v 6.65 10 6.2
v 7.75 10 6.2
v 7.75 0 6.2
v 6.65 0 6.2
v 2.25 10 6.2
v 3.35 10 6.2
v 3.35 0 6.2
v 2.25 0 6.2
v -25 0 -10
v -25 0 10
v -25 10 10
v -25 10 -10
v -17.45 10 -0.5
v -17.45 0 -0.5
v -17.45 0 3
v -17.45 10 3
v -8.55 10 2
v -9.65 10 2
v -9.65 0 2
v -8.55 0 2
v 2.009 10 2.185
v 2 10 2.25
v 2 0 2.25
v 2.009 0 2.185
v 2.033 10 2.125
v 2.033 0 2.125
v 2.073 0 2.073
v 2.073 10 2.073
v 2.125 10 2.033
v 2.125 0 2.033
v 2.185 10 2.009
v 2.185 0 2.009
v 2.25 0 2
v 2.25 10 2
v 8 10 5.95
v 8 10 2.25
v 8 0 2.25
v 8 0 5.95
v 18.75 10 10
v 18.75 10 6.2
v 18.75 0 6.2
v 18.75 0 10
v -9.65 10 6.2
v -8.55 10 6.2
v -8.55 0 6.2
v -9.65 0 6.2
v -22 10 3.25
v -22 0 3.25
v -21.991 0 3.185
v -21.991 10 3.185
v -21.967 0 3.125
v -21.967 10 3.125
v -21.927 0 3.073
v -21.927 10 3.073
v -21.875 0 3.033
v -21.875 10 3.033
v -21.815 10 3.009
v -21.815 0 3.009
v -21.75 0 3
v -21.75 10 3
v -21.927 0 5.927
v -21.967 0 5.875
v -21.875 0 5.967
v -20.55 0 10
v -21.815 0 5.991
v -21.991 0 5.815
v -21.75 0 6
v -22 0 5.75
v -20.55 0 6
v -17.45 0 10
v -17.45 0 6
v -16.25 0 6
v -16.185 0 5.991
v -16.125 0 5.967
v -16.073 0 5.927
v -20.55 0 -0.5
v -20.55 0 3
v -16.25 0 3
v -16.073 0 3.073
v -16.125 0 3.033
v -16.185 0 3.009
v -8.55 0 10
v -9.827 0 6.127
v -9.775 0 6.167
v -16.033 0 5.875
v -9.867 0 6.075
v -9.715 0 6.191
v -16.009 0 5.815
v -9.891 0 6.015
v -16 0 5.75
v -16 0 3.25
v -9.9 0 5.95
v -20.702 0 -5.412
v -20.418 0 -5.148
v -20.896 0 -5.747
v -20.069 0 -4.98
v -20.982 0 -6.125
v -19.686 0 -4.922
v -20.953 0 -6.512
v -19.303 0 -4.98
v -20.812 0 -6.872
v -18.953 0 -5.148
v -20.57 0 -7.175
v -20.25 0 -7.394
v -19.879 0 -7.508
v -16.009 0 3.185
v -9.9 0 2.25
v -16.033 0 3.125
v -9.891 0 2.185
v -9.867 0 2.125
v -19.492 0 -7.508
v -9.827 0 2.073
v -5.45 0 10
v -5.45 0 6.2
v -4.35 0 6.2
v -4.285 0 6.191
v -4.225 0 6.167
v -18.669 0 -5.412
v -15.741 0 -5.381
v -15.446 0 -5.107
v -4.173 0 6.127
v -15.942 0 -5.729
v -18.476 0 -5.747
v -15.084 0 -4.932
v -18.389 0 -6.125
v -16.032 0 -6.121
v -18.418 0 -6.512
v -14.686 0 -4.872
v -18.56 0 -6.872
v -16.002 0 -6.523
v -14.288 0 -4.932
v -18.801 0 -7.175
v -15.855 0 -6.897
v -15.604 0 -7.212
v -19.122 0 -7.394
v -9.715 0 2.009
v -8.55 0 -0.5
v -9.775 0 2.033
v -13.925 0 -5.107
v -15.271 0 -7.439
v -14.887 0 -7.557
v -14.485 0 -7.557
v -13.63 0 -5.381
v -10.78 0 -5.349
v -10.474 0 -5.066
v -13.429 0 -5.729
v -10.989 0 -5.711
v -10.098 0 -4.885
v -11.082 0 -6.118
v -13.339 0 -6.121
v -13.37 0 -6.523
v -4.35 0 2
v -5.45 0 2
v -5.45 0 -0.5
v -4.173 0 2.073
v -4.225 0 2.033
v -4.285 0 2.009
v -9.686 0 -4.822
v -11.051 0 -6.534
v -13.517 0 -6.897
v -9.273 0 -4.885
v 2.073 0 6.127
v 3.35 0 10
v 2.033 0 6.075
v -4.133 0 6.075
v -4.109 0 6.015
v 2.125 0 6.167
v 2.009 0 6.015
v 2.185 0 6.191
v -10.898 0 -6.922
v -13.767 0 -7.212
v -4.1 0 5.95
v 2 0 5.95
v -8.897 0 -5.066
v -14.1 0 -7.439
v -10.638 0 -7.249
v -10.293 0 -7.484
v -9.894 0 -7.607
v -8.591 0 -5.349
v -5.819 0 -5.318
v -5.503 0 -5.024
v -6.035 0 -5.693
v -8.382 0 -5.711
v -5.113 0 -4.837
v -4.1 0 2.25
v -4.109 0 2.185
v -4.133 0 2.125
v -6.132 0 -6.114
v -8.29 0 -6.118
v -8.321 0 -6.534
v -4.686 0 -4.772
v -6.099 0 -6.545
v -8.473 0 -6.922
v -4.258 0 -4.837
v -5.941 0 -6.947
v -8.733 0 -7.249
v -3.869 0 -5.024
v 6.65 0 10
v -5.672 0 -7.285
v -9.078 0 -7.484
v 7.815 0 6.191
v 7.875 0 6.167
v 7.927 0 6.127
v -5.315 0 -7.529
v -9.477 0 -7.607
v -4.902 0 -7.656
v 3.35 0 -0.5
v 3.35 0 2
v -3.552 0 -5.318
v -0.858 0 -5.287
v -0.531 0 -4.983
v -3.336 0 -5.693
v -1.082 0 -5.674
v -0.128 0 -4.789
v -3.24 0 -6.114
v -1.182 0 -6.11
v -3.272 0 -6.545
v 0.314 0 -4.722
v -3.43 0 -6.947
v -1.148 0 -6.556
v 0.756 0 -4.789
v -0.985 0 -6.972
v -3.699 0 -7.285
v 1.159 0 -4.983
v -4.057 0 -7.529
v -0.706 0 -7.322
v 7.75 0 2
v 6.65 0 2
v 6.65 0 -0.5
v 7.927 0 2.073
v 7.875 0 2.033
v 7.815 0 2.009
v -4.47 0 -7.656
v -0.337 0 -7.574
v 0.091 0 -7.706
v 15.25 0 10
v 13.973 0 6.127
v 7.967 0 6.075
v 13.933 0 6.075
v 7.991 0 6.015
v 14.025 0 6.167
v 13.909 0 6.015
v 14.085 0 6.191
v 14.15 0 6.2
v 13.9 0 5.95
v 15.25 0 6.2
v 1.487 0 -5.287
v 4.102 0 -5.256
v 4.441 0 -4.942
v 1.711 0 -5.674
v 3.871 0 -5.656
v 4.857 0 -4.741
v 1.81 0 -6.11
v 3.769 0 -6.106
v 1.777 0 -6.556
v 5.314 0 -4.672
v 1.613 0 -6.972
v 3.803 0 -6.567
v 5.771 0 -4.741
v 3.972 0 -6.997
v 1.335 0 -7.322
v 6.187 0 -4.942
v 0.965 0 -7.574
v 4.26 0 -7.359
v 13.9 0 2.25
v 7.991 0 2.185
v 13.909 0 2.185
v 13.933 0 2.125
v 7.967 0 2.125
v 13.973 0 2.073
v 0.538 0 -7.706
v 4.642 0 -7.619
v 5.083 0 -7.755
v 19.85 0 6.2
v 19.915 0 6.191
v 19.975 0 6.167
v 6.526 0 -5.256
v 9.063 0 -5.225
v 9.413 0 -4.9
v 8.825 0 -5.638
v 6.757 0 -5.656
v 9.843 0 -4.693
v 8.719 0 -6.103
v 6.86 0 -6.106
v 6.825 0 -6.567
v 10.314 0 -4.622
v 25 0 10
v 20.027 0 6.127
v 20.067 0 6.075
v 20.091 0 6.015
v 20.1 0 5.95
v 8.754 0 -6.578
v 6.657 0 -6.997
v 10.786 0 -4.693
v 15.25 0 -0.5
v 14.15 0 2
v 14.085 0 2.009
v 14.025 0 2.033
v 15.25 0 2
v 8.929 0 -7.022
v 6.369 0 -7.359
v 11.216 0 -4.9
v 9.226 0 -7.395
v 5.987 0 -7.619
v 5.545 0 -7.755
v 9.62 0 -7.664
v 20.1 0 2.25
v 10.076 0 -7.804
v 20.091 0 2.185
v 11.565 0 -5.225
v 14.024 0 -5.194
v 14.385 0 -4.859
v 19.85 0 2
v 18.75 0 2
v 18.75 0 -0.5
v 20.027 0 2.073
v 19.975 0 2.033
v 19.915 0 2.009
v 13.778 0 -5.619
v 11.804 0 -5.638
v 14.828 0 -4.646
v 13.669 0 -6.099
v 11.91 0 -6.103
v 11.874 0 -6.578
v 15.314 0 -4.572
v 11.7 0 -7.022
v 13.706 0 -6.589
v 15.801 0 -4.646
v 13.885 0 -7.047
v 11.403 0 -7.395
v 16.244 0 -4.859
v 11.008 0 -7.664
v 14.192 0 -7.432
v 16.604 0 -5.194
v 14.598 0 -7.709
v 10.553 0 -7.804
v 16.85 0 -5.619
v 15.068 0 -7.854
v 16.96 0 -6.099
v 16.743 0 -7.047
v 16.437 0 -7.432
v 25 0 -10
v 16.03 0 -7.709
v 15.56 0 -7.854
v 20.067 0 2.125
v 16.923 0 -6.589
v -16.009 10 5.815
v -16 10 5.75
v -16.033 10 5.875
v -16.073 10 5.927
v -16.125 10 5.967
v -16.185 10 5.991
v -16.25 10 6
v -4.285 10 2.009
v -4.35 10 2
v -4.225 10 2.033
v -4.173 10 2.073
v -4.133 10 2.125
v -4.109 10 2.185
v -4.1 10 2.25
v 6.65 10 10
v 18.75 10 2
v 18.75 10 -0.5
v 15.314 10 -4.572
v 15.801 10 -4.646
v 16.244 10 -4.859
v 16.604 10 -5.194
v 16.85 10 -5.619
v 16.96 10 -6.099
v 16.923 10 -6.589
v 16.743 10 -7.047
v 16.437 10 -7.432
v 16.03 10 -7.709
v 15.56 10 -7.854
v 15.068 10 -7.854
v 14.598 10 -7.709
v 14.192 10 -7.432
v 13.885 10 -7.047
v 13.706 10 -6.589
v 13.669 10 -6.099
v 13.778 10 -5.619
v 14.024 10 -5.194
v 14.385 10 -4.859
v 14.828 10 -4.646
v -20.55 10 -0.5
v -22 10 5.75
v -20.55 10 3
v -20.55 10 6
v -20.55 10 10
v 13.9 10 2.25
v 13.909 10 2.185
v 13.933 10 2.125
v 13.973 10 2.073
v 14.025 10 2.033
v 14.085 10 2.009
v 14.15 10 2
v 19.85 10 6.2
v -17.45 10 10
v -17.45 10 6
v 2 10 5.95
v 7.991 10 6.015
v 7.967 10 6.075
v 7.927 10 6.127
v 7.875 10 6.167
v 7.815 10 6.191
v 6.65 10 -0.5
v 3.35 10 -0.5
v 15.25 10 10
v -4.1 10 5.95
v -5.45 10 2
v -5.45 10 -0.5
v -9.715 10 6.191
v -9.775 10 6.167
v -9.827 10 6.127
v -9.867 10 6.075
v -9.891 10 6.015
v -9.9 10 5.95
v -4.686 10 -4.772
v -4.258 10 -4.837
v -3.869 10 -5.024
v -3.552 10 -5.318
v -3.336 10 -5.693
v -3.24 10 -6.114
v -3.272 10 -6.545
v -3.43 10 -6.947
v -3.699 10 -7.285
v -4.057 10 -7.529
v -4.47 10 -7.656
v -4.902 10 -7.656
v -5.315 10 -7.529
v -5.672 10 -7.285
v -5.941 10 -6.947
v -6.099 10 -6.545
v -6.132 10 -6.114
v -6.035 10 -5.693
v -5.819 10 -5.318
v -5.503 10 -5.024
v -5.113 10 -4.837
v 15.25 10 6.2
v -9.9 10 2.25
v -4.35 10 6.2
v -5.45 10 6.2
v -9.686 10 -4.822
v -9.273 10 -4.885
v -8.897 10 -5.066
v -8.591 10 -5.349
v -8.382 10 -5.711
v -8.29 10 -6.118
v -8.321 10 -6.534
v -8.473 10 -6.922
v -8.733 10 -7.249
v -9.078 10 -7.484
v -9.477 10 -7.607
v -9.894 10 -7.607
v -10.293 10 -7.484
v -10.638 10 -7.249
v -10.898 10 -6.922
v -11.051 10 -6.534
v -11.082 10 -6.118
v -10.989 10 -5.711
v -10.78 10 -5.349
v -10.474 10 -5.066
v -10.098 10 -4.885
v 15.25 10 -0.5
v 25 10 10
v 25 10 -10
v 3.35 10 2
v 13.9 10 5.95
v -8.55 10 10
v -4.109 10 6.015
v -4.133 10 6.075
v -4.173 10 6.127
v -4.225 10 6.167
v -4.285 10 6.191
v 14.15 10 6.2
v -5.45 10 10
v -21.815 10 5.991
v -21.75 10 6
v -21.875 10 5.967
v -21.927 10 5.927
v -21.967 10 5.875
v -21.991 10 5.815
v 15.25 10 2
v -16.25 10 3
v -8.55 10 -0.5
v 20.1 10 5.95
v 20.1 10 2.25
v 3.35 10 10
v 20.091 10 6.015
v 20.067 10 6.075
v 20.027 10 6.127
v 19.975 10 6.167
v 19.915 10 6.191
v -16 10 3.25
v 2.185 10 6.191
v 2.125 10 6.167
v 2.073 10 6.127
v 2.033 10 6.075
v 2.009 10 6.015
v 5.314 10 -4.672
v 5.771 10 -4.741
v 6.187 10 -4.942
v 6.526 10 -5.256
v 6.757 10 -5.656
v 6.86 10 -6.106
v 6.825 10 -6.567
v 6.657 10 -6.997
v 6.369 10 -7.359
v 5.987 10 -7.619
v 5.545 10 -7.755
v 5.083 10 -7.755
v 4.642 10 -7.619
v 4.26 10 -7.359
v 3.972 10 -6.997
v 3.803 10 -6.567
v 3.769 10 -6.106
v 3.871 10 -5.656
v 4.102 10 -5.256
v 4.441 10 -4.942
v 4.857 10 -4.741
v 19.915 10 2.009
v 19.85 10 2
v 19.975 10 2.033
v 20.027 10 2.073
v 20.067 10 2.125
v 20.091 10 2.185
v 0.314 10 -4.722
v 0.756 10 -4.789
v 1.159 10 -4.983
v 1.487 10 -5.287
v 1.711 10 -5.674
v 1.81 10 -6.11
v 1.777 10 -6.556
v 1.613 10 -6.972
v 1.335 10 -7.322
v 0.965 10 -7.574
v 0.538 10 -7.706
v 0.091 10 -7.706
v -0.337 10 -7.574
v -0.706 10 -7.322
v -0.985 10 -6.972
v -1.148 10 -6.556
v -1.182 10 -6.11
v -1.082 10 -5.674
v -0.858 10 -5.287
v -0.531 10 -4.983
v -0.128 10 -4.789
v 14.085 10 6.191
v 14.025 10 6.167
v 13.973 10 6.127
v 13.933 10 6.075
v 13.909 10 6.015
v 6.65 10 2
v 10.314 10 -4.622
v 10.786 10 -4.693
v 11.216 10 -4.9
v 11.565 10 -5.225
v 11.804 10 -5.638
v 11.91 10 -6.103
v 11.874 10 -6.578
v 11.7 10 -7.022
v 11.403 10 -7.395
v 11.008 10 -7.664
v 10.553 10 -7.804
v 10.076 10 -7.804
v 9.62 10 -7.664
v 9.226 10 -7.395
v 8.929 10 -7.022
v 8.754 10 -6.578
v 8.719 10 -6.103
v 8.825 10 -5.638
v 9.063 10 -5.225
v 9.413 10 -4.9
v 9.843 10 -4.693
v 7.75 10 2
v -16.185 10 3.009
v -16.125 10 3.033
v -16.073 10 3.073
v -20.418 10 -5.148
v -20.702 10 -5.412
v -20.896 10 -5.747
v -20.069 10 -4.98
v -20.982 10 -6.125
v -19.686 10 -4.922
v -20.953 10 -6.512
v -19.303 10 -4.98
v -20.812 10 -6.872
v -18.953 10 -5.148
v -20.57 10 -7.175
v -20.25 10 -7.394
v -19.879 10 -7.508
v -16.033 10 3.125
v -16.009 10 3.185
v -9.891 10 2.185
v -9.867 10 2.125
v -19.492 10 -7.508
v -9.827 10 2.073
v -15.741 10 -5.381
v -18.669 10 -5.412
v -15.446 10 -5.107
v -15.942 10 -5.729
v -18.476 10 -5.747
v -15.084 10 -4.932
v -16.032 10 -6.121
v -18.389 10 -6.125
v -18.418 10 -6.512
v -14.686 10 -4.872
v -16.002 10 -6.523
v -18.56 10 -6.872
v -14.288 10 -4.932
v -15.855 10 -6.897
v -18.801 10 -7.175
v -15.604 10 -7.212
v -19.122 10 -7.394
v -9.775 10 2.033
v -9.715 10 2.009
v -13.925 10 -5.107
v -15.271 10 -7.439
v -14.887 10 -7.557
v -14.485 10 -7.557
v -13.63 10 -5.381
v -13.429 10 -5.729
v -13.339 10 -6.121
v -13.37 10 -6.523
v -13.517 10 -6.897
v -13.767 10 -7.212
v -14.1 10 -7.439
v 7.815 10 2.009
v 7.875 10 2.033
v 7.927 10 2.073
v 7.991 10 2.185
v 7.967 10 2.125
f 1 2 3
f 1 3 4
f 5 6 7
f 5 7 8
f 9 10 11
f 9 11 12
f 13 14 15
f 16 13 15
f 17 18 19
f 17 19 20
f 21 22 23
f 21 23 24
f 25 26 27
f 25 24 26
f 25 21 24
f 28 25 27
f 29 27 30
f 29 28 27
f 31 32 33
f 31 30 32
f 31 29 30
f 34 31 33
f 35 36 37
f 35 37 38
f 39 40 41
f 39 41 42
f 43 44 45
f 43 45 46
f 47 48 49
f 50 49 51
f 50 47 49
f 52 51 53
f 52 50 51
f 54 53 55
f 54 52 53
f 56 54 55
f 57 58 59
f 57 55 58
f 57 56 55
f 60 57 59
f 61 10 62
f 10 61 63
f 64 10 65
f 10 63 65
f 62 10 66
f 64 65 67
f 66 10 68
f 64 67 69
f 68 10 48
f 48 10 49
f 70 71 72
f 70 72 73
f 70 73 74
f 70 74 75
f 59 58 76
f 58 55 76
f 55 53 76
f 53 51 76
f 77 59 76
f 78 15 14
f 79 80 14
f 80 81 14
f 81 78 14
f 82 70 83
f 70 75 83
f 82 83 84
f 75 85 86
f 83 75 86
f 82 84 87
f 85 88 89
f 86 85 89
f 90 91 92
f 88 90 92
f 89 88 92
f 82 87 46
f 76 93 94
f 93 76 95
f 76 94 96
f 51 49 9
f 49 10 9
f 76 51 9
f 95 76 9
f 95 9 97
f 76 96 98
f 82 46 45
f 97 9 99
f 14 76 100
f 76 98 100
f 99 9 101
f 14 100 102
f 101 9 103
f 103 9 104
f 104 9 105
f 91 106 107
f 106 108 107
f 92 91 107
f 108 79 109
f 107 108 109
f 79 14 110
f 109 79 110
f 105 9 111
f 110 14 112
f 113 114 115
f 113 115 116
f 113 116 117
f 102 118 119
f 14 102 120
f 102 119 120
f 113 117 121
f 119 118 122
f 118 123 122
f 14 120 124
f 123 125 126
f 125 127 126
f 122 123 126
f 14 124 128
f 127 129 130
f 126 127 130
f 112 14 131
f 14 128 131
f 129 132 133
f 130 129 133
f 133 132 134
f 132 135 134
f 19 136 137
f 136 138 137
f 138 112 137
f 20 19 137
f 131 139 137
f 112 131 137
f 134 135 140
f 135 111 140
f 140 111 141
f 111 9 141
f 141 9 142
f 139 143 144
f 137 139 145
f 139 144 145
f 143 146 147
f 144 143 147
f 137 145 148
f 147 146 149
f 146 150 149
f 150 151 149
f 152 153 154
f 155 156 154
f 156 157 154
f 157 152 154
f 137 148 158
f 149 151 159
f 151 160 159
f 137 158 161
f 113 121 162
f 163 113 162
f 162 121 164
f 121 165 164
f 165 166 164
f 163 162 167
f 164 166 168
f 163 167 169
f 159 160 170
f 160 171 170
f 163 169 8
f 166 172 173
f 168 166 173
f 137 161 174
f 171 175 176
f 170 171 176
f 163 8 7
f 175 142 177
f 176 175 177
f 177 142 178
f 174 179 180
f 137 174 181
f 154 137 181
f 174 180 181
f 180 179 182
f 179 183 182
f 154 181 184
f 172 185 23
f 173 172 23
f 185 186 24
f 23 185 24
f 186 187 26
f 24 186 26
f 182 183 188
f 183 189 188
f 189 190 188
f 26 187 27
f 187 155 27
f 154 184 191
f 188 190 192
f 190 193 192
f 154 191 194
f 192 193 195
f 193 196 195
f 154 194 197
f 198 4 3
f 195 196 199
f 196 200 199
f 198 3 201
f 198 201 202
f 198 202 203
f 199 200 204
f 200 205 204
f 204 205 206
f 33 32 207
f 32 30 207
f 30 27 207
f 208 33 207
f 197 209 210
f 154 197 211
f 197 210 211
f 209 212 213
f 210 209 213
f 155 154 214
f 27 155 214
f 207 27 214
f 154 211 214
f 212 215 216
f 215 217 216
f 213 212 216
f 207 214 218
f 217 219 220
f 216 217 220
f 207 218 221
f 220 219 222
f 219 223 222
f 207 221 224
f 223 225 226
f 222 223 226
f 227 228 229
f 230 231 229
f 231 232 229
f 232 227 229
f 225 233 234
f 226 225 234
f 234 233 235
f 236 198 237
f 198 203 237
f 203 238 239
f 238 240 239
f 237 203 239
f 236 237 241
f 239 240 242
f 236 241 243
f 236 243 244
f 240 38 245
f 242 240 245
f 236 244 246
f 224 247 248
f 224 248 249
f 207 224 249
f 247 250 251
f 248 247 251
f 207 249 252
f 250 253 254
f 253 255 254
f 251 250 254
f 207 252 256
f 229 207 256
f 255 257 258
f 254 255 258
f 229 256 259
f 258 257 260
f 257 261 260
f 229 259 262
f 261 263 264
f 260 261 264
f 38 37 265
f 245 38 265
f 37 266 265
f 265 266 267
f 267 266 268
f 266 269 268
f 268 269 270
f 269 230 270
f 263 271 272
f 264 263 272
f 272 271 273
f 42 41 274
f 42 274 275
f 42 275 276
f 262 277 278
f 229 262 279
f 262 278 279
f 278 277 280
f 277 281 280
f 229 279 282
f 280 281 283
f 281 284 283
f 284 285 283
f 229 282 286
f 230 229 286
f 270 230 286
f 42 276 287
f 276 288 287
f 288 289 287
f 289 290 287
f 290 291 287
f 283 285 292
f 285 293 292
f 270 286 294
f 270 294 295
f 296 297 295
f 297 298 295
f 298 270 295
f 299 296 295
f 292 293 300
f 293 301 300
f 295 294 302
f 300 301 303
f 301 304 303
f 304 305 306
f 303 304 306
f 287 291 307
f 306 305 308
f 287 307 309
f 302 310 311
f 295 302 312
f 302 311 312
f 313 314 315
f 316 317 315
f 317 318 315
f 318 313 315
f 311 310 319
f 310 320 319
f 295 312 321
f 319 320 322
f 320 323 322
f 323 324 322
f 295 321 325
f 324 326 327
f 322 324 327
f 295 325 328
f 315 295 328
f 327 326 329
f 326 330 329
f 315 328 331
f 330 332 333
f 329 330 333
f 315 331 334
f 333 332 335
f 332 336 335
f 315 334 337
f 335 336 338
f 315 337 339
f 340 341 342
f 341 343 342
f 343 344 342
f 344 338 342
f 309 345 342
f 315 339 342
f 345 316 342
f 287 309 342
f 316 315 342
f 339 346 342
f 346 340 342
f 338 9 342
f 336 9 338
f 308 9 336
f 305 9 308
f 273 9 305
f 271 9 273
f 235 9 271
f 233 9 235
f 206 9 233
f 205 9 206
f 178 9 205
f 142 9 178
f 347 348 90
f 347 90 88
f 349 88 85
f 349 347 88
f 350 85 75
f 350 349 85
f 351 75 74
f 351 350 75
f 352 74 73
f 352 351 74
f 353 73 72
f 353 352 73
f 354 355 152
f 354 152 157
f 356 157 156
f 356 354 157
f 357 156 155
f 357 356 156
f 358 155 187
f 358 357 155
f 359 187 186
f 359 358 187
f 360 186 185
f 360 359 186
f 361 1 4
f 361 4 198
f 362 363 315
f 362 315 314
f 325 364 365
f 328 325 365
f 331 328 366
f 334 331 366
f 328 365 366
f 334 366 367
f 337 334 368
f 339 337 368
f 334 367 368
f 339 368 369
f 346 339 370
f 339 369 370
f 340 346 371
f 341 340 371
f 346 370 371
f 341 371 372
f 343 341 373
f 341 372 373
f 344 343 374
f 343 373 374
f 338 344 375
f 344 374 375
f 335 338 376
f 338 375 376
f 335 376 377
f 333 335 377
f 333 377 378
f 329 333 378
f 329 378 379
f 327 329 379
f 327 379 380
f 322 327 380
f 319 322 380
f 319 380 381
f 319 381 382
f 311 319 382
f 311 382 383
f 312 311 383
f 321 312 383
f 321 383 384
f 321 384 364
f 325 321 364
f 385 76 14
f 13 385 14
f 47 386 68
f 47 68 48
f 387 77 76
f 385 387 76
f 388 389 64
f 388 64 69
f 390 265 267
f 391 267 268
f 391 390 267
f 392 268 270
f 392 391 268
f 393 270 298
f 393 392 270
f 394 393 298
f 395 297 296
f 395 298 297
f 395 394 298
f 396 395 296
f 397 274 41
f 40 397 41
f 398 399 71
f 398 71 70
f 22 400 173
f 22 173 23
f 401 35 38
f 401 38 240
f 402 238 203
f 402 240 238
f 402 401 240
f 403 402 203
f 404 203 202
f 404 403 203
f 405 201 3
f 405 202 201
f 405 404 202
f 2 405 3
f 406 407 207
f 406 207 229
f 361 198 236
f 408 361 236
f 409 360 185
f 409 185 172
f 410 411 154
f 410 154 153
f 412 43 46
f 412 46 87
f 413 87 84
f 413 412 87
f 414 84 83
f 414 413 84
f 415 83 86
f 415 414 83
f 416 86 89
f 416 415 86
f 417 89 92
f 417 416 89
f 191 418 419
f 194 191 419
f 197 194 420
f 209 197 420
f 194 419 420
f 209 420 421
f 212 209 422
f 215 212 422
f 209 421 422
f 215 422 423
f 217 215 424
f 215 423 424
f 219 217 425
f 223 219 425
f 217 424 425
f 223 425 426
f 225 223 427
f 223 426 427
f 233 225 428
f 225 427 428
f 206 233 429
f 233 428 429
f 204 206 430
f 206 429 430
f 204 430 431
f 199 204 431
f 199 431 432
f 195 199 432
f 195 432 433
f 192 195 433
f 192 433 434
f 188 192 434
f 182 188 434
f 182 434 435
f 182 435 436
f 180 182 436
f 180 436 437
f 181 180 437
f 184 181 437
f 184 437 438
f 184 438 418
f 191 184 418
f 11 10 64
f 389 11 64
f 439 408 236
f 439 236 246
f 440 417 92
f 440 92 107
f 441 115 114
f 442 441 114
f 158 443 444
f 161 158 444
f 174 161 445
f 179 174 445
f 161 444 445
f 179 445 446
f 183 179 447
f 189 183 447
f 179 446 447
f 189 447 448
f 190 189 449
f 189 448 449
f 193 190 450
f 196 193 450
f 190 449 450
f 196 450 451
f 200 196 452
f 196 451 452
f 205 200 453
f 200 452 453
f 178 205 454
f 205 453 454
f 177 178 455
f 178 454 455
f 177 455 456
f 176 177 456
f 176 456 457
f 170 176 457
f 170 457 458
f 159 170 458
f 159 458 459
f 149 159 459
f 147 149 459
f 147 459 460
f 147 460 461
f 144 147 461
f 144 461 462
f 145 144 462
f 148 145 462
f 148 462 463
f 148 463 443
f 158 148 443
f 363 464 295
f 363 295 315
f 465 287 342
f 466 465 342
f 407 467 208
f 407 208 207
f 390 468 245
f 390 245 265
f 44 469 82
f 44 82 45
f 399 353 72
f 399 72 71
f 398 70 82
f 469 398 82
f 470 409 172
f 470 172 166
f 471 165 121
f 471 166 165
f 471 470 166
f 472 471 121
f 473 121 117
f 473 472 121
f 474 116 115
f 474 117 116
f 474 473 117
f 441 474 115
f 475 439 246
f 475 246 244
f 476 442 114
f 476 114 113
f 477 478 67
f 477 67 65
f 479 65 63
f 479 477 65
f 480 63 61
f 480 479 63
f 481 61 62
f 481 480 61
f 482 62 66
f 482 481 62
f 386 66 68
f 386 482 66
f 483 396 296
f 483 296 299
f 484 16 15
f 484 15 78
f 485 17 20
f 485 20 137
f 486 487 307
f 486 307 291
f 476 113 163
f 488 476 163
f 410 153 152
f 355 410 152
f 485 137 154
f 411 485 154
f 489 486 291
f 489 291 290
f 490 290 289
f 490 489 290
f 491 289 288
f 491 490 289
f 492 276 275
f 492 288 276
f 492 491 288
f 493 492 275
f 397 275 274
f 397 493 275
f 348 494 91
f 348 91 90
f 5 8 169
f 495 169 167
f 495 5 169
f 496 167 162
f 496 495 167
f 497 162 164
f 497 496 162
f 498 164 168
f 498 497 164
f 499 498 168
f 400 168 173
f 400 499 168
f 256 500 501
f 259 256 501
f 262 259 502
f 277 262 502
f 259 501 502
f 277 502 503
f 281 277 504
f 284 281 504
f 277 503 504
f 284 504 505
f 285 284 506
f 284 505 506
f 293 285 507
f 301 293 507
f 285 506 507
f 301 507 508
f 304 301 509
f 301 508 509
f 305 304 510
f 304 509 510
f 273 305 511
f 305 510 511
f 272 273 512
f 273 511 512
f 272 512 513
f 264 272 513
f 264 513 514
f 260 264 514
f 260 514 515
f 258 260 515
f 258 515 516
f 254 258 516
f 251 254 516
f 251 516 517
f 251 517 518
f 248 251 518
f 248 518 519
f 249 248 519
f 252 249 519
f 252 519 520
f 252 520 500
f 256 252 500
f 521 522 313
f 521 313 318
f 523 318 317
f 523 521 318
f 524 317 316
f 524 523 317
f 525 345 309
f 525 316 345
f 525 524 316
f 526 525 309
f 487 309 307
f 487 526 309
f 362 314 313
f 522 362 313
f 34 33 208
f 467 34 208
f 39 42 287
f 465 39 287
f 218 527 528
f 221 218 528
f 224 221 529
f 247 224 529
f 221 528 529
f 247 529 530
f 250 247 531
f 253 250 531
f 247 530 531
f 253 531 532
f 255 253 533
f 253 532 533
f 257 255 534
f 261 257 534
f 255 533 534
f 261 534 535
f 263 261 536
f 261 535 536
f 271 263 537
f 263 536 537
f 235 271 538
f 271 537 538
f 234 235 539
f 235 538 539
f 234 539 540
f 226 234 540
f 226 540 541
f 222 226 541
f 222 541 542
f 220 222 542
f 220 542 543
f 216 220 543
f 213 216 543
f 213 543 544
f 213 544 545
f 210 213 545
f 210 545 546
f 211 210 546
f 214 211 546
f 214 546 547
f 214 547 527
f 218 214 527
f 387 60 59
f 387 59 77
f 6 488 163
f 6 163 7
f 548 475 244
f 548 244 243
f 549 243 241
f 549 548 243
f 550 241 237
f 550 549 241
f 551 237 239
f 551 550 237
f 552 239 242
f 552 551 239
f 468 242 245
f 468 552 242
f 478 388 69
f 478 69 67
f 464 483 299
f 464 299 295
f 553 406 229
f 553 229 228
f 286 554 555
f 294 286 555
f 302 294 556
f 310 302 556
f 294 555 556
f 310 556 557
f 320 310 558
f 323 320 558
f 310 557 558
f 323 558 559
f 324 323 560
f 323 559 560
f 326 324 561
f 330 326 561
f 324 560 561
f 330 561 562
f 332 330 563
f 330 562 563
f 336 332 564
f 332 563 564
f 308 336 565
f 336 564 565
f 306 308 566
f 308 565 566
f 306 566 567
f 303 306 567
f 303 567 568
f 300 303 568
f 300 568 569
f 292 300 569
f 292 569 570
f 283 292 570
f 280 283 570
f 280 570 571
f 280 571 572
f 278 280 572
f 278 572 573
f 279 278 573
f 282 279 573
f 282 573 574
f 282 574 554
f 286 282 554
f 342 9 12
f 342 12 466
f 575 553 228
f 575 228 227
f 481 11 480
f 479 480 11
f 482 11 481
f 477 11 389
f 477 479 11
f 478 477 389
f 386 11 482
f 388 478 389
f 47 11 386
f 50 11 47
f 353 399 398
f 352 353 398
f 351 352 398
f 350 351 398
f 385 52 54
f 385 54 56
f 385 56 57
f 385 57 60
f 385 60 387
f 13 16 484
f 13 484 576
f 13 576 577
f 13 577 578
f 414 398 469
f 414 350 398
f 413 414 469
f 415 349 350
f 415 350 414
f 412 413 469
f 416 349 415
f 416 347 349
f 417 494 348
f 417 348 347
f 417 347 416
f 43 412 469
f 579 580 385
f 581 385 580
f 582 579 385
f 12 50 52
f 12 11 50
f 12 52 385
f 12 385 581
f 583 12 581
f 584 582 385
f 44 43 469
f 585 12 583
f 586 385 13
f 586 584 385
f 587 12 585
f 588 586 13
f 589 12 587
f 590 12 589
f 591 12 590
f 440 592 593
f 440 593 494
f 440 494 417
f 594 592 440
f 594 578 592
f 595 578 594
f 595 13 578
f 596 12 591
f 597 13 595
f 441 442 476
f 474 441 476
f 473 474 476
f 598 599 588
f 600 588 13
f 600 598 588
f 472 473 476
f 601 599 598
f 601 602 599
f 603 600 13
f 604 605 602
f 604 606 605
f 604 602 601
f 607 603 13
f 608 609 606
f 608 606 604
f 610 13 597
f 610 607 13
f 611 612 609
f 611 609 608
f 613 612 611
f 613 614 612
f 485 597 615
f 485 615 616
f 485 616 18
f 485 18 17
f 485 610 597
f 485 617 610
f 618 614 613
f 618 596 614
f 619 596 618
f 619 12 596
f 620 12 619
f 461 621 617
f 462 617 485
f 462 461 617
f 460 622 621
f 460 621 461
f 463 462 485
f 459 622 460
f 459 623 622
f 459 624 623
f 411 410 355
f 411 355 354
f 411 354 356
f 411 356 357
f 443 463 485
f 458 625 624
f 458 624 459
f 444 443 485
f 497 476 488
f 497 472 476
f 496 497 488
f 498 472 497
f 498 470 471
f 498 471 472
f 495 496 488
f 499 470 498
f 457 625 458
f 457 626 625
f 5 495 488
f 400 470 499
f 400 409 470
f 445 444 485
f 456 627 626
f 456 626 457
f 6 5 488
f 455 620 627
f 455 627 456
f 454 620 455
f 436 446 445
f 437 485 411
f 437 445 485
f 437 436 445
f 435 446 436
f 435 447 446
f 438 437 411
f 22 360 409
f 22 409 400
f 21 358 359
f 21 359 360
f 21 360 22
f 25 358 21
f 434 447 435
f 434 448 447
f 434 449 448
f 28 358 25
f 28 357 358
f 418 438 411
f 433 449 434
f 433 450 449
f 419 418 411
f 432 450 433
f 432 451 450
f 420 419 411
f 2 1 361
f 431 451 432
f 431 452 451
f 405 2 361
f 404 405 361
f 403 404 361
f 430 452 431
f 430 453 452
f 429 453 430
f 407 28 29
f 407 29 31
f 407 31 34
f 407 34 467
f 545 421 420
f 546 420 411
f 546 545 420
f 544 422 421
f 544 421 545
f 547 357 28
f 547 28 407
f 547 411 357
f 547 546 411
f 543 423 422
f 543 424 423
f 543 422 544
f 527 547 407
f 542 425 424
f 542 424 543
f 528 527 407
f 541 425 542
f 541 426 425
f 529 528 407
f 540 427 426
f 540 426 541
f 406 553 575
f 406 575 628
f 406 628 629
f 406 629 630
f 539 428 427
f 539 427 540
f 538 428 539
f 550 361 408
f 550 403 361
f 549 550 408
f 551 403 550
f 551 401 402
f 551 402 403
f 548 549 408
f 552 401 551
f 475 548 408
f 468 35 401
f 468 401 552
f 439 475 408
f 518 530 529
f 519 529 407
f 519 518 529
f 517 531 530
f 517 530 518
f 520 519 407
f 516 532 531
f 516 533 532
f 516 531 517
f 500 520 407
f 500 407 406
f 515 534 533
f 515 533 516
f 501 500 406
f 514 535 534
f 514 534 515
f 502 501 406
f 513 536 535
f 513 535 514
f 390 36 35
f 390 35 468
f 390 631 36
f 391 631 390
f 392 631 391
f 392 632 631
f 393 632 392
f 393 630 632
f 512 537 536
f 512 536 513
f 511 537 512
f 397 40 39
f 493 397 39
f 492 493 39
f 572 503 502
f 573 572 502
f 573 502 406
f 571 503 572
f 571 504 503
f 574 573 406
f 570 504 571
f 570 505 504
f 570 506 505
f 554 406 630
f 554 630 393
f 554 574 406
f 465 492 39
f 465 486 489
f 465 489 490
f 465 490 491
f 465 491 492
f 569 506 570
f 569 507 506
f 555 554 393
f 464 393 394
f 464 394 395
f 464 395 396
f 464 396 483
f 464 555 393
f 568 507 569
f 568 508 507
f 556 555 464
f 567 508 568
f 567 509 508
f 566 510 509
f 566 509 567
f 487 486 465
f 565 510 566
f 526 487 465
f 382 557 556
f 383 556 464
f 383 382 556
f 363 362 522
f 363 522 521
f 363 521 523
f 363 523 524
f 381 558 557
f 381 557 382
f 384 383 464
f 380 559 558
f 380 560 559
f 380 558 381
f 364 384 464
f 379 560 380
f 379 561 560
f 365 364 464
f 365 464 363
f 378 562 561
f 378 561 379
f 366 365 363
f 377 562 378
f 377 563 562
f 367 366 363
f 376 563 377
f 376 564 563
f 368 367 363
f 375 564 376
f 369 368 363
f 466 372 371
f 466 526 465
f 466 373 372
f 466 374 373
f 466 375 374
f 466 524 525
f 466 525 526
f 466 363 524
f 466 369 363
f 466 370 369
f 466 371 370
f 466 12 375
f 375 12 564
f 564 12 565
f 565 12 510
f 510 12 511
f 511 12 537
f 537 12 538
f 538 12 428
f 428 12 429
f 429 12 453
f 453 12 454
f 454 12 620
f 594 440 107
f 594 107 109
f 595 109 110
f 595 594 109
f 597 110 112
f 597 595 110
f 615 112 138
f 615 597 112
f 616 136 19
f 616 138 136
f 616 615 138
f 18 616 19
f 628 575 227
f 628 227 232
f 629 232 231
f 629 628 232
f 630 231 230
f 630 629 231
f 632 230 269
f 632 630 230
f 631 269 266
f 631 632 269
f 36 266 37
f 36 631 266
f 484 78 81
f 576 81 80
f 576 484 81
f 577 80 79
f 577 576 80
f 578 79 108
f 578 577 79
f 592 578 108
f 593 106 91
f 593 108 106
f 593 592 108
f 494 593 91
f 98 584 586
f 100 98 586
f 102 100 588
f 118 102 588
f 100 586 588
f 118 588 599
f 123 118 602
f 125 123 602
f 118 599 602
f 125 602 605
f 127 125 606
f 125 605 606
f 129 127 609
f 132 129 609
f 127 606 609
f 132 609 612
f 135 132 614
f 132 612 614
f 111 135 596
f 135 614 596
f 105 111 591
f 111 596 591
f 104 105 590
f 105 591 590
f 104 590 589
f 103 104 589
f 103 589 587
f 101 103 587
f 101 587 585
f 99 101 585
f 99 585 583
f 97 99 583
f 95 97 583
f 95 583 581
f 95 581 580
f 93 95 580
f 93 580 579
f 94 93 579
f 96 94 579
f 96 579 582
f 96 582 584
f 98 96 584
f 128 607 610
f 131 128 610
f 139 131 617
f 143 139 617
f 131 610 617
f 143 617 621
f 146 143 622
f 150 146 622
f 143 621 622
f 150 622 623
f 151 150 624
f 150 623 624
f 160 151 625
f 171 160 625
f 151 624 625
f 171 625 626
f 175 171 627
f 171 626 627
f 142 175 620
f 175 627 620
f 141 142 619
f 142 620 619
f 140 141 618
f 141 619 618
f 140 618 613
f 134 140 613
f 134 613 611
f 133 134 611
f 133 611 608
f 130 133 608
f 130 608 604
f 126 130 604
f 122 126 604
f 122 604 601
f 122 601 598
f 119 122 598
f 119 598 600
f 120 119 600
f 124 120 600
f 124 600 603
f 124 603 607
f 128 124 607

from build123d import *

# Parameters (mm, degrees)
SKETCH2_W           = 50
SKETCH2_H           = 20
BOSS_EXTRUDE1_DEPTH = 10
SKETCH3_R           = 1.3
SKETCH3_R_2         = 1.35
SKETCH3_R_3         = 1.4
SKETCH3_R_4         = 1.45
SKETCH3_R_5         = 1.5
SKETCH3_R_6         = 1.55
SKETCH3_R_7         = 1.6
SKETCH3_R_8         = 1.65
CUT_EXTRUDE1_DEPTH  = 29.722813233


with BuildPart() as part:
    # Sketch2 → Boss-Extrude1 (new body)
    with BuildSketch(Plane(origin=(0, 0, 0), x_dir=(1, 0, 0), z_dir=(0, 1, 0))):
        Rectangle(SKETCH2_W, SKETCH2_H)
    extrude(amount=BOSS_EXTRUDE1_DEPTH)

    # Sketch3 → Cut-Extrude1 (cut, through all)
    with BuildSketch(Plane(origin=(0, 10, 0), x_dir=(1, 0, 0), z_dir=(0, 1, 0))):
        with Locations(Location((-19.685722489, 6.222302146, 0), (0, 0, 270))):
            Circle(SKETCH3_R)
        with Locations(Location((-14.685722489, 6.222302146, 0), (0, 0, 270))):
            Circle(SKETCH3_R_2)
        with Locations(Location((-9.685722489, 6.222302146, 0), (0, 0, 270))):
            Circle(SKETCH3_R_3)
        with Locations(Location((-4.685722489, 6.222302146, 0), (0, 0, 270))):
            Circle(SKETCH3_R_4)
        with Locations(Location((0.314277511, 6.222302146, 0), (0, 0, 270))):
            Circle(SKETCH3_R_5)
        with Locations(Location((5.314277511, 6.222302146, 0), (0, 0, 270))):
            Circle(SKETCH3_R_6)
        with Locations(Location((10.314277511, 6.222302146, 0), (0, 0, 270))):
            Circle(SKETCH3_R_7)
        with Locations(Location((15.314277511, 6.222302146, 0), (0, 0, 270))):
            Circle(SKETCH3_R_8)
        with BuildLine():
            Line((6.65, -10), (3.35, -10))
            Line((3.35, -10), (3.35, -6.2))
            Line((3.35, -6.2), (2.25, -6.2))
            ThreePointArc((2.25, -6.2), (2.073223305, -6.126776695), (2, -5.95))
            Line((2, -5.95), (2, -2.25))
            ThreePointArc((2, -2.25), (2.073223305, -2.073223305), (2.25, -2))
            Line((2.25, -2), (3.35, -2))
            Line((3.35, -2), (3.35, 0.5))
            Line((3.35, 0.5), (6.65, 0.5))
            Line((6.65, 0.5), (6.65, -2))
            Line((6.65, -2), (7.75, -2))
            ThreePointArc((7.75, -2), (7.926776695, -2.073223305), (8, -2.25))
            Line((8, -2.25), (8, -5.95))
            ThreePointArc((8, -5.95), (7.926776695, -6.126776695), (7.75, -6.2))
            Line((7.75, -6.2), (6.65, -6.2))
            Line((6.65, -6.2), (6.65, -10))
        make_face()
        with BuildLine():
            Line((15.25, 0.5), (18.75, 0.5))
            Line((18.75, 0.5), (18.75, -2))
            Line((18.75, -2), (19.85, -2))
            ThreePointArc((19.85, -2), (20.026776695, -2.073223305), (20.1, -2.25))
            Line((20.1, -2.25), (20.1, -5.95))
            ThreePointArc((20.1, -5.95), (20.026776695, -6.126776695), (19.85, -6.2))
            Line((19.85, -6.2), (18.75, -6.2))
            Line((18.75, -6.2), (18.75, -10))
            Line((18.75, -10), (15.25, -10))
            Line((15.25, -10), (15.25, -6.2))
            Line((15.25, -6.2), (14.15, -6.2))
            ThreePointArc((14.15, -6.2), (13.973223305, -6.126776695), (13.9, -5.95))
            Line((13.9, -5.95), (13.9, -2.25))
            ThreePointArc((13.9, -2.25), (13.973223305, -2.073223305), (14.15, -2))
            Line((14.15, -2), (15.25, -2))
            Line((15.25, -2), (15.25, 0.5))
        make_face()
        with BuildLine():
            Line((-8.55, 0.5), (-5.45, 0.5))
            Line((-5.45, 0.5), (-5.45, -2))
            Line((-5.45, -2), (-4.35, -2))
            ThreePointArc((-4.35, -2), (-4.173223305, -2.073223305), (-4.1, -2.25))
            Line((-4.1, -2.25), (-4.1, -5.95))
            ThreePointArc((-4.1, -5.95), (-4.173223305, -6.126776695), (-4.35, -6.2))
            Line((-4.35, -6.2), (-5.45, -6.2))
            Line((-5.45, -6.2), (-5.45, -10))
            Line((-5.45, -10), (-8.55, -10))
            Line((-8.55, -10), (-8.55, -6.2))
            Line((-8.55, -6.2), (-9.65, -6.2))
            ThreePointArc((-9.65, -6.2), (-9.826776695, -6.126776695), (-9.9, -5.95))
            Line((-9.9, -5.95), (-9.9, -2.25))
            ThreePointArc((-9.9, -2.25), (-9.826776695, -2.073223305), (-9.65, -2))
            Line((-9.65, -2), (-8.55, -2))
            Line((-8.55, -2), (-8.55, 0.5))
        make_face()
        with BuildLine():
            Line((-20.55, 0.5), (-17.45, 0.5))
            Line((-17.45, 0.5), (-17.45, -3))
            Line((-17.45, -3), (-16.25, -3))
            ThreePointArc((-16.25, -3), (-16.073223305, -3.073223305), (-16, -3.25))
            Line((-16, -3.25), (-16, -5.75))
            ThreePointArc((-16, -5.75), (-16.073223305, -5.926776695), (-16.25, -6))
            Line((-16.25, -6), (-17.45, -6))
            Line((-17.45, -6), (-17.45, -10))
            Line((-17.45, -10), (-20.55, -10))
            Line((-20.55, -10), (-20.55, -6))
            Line((-20.55, -6), (-21.75, -6))
            ThreePointArc((-21.75, -6), (-21.926776695, -5.926776695), (-22, -5.75))
            Line((-22, -5.75), (-22, -3.25))
            ThreePointArc((-22, -3.25), (-21.926776695, -3.073223305), (-21.75, -3))
            Line((-21.75, -3), (-20.55, -3))
            Line((-20.55, -3), (-20.55, 0.5))
        make_face()
    extrude(amount=-CUT_EXTRUDE1_DEPTH, mode=Mode.SUBTRACT)


solid = part.part
